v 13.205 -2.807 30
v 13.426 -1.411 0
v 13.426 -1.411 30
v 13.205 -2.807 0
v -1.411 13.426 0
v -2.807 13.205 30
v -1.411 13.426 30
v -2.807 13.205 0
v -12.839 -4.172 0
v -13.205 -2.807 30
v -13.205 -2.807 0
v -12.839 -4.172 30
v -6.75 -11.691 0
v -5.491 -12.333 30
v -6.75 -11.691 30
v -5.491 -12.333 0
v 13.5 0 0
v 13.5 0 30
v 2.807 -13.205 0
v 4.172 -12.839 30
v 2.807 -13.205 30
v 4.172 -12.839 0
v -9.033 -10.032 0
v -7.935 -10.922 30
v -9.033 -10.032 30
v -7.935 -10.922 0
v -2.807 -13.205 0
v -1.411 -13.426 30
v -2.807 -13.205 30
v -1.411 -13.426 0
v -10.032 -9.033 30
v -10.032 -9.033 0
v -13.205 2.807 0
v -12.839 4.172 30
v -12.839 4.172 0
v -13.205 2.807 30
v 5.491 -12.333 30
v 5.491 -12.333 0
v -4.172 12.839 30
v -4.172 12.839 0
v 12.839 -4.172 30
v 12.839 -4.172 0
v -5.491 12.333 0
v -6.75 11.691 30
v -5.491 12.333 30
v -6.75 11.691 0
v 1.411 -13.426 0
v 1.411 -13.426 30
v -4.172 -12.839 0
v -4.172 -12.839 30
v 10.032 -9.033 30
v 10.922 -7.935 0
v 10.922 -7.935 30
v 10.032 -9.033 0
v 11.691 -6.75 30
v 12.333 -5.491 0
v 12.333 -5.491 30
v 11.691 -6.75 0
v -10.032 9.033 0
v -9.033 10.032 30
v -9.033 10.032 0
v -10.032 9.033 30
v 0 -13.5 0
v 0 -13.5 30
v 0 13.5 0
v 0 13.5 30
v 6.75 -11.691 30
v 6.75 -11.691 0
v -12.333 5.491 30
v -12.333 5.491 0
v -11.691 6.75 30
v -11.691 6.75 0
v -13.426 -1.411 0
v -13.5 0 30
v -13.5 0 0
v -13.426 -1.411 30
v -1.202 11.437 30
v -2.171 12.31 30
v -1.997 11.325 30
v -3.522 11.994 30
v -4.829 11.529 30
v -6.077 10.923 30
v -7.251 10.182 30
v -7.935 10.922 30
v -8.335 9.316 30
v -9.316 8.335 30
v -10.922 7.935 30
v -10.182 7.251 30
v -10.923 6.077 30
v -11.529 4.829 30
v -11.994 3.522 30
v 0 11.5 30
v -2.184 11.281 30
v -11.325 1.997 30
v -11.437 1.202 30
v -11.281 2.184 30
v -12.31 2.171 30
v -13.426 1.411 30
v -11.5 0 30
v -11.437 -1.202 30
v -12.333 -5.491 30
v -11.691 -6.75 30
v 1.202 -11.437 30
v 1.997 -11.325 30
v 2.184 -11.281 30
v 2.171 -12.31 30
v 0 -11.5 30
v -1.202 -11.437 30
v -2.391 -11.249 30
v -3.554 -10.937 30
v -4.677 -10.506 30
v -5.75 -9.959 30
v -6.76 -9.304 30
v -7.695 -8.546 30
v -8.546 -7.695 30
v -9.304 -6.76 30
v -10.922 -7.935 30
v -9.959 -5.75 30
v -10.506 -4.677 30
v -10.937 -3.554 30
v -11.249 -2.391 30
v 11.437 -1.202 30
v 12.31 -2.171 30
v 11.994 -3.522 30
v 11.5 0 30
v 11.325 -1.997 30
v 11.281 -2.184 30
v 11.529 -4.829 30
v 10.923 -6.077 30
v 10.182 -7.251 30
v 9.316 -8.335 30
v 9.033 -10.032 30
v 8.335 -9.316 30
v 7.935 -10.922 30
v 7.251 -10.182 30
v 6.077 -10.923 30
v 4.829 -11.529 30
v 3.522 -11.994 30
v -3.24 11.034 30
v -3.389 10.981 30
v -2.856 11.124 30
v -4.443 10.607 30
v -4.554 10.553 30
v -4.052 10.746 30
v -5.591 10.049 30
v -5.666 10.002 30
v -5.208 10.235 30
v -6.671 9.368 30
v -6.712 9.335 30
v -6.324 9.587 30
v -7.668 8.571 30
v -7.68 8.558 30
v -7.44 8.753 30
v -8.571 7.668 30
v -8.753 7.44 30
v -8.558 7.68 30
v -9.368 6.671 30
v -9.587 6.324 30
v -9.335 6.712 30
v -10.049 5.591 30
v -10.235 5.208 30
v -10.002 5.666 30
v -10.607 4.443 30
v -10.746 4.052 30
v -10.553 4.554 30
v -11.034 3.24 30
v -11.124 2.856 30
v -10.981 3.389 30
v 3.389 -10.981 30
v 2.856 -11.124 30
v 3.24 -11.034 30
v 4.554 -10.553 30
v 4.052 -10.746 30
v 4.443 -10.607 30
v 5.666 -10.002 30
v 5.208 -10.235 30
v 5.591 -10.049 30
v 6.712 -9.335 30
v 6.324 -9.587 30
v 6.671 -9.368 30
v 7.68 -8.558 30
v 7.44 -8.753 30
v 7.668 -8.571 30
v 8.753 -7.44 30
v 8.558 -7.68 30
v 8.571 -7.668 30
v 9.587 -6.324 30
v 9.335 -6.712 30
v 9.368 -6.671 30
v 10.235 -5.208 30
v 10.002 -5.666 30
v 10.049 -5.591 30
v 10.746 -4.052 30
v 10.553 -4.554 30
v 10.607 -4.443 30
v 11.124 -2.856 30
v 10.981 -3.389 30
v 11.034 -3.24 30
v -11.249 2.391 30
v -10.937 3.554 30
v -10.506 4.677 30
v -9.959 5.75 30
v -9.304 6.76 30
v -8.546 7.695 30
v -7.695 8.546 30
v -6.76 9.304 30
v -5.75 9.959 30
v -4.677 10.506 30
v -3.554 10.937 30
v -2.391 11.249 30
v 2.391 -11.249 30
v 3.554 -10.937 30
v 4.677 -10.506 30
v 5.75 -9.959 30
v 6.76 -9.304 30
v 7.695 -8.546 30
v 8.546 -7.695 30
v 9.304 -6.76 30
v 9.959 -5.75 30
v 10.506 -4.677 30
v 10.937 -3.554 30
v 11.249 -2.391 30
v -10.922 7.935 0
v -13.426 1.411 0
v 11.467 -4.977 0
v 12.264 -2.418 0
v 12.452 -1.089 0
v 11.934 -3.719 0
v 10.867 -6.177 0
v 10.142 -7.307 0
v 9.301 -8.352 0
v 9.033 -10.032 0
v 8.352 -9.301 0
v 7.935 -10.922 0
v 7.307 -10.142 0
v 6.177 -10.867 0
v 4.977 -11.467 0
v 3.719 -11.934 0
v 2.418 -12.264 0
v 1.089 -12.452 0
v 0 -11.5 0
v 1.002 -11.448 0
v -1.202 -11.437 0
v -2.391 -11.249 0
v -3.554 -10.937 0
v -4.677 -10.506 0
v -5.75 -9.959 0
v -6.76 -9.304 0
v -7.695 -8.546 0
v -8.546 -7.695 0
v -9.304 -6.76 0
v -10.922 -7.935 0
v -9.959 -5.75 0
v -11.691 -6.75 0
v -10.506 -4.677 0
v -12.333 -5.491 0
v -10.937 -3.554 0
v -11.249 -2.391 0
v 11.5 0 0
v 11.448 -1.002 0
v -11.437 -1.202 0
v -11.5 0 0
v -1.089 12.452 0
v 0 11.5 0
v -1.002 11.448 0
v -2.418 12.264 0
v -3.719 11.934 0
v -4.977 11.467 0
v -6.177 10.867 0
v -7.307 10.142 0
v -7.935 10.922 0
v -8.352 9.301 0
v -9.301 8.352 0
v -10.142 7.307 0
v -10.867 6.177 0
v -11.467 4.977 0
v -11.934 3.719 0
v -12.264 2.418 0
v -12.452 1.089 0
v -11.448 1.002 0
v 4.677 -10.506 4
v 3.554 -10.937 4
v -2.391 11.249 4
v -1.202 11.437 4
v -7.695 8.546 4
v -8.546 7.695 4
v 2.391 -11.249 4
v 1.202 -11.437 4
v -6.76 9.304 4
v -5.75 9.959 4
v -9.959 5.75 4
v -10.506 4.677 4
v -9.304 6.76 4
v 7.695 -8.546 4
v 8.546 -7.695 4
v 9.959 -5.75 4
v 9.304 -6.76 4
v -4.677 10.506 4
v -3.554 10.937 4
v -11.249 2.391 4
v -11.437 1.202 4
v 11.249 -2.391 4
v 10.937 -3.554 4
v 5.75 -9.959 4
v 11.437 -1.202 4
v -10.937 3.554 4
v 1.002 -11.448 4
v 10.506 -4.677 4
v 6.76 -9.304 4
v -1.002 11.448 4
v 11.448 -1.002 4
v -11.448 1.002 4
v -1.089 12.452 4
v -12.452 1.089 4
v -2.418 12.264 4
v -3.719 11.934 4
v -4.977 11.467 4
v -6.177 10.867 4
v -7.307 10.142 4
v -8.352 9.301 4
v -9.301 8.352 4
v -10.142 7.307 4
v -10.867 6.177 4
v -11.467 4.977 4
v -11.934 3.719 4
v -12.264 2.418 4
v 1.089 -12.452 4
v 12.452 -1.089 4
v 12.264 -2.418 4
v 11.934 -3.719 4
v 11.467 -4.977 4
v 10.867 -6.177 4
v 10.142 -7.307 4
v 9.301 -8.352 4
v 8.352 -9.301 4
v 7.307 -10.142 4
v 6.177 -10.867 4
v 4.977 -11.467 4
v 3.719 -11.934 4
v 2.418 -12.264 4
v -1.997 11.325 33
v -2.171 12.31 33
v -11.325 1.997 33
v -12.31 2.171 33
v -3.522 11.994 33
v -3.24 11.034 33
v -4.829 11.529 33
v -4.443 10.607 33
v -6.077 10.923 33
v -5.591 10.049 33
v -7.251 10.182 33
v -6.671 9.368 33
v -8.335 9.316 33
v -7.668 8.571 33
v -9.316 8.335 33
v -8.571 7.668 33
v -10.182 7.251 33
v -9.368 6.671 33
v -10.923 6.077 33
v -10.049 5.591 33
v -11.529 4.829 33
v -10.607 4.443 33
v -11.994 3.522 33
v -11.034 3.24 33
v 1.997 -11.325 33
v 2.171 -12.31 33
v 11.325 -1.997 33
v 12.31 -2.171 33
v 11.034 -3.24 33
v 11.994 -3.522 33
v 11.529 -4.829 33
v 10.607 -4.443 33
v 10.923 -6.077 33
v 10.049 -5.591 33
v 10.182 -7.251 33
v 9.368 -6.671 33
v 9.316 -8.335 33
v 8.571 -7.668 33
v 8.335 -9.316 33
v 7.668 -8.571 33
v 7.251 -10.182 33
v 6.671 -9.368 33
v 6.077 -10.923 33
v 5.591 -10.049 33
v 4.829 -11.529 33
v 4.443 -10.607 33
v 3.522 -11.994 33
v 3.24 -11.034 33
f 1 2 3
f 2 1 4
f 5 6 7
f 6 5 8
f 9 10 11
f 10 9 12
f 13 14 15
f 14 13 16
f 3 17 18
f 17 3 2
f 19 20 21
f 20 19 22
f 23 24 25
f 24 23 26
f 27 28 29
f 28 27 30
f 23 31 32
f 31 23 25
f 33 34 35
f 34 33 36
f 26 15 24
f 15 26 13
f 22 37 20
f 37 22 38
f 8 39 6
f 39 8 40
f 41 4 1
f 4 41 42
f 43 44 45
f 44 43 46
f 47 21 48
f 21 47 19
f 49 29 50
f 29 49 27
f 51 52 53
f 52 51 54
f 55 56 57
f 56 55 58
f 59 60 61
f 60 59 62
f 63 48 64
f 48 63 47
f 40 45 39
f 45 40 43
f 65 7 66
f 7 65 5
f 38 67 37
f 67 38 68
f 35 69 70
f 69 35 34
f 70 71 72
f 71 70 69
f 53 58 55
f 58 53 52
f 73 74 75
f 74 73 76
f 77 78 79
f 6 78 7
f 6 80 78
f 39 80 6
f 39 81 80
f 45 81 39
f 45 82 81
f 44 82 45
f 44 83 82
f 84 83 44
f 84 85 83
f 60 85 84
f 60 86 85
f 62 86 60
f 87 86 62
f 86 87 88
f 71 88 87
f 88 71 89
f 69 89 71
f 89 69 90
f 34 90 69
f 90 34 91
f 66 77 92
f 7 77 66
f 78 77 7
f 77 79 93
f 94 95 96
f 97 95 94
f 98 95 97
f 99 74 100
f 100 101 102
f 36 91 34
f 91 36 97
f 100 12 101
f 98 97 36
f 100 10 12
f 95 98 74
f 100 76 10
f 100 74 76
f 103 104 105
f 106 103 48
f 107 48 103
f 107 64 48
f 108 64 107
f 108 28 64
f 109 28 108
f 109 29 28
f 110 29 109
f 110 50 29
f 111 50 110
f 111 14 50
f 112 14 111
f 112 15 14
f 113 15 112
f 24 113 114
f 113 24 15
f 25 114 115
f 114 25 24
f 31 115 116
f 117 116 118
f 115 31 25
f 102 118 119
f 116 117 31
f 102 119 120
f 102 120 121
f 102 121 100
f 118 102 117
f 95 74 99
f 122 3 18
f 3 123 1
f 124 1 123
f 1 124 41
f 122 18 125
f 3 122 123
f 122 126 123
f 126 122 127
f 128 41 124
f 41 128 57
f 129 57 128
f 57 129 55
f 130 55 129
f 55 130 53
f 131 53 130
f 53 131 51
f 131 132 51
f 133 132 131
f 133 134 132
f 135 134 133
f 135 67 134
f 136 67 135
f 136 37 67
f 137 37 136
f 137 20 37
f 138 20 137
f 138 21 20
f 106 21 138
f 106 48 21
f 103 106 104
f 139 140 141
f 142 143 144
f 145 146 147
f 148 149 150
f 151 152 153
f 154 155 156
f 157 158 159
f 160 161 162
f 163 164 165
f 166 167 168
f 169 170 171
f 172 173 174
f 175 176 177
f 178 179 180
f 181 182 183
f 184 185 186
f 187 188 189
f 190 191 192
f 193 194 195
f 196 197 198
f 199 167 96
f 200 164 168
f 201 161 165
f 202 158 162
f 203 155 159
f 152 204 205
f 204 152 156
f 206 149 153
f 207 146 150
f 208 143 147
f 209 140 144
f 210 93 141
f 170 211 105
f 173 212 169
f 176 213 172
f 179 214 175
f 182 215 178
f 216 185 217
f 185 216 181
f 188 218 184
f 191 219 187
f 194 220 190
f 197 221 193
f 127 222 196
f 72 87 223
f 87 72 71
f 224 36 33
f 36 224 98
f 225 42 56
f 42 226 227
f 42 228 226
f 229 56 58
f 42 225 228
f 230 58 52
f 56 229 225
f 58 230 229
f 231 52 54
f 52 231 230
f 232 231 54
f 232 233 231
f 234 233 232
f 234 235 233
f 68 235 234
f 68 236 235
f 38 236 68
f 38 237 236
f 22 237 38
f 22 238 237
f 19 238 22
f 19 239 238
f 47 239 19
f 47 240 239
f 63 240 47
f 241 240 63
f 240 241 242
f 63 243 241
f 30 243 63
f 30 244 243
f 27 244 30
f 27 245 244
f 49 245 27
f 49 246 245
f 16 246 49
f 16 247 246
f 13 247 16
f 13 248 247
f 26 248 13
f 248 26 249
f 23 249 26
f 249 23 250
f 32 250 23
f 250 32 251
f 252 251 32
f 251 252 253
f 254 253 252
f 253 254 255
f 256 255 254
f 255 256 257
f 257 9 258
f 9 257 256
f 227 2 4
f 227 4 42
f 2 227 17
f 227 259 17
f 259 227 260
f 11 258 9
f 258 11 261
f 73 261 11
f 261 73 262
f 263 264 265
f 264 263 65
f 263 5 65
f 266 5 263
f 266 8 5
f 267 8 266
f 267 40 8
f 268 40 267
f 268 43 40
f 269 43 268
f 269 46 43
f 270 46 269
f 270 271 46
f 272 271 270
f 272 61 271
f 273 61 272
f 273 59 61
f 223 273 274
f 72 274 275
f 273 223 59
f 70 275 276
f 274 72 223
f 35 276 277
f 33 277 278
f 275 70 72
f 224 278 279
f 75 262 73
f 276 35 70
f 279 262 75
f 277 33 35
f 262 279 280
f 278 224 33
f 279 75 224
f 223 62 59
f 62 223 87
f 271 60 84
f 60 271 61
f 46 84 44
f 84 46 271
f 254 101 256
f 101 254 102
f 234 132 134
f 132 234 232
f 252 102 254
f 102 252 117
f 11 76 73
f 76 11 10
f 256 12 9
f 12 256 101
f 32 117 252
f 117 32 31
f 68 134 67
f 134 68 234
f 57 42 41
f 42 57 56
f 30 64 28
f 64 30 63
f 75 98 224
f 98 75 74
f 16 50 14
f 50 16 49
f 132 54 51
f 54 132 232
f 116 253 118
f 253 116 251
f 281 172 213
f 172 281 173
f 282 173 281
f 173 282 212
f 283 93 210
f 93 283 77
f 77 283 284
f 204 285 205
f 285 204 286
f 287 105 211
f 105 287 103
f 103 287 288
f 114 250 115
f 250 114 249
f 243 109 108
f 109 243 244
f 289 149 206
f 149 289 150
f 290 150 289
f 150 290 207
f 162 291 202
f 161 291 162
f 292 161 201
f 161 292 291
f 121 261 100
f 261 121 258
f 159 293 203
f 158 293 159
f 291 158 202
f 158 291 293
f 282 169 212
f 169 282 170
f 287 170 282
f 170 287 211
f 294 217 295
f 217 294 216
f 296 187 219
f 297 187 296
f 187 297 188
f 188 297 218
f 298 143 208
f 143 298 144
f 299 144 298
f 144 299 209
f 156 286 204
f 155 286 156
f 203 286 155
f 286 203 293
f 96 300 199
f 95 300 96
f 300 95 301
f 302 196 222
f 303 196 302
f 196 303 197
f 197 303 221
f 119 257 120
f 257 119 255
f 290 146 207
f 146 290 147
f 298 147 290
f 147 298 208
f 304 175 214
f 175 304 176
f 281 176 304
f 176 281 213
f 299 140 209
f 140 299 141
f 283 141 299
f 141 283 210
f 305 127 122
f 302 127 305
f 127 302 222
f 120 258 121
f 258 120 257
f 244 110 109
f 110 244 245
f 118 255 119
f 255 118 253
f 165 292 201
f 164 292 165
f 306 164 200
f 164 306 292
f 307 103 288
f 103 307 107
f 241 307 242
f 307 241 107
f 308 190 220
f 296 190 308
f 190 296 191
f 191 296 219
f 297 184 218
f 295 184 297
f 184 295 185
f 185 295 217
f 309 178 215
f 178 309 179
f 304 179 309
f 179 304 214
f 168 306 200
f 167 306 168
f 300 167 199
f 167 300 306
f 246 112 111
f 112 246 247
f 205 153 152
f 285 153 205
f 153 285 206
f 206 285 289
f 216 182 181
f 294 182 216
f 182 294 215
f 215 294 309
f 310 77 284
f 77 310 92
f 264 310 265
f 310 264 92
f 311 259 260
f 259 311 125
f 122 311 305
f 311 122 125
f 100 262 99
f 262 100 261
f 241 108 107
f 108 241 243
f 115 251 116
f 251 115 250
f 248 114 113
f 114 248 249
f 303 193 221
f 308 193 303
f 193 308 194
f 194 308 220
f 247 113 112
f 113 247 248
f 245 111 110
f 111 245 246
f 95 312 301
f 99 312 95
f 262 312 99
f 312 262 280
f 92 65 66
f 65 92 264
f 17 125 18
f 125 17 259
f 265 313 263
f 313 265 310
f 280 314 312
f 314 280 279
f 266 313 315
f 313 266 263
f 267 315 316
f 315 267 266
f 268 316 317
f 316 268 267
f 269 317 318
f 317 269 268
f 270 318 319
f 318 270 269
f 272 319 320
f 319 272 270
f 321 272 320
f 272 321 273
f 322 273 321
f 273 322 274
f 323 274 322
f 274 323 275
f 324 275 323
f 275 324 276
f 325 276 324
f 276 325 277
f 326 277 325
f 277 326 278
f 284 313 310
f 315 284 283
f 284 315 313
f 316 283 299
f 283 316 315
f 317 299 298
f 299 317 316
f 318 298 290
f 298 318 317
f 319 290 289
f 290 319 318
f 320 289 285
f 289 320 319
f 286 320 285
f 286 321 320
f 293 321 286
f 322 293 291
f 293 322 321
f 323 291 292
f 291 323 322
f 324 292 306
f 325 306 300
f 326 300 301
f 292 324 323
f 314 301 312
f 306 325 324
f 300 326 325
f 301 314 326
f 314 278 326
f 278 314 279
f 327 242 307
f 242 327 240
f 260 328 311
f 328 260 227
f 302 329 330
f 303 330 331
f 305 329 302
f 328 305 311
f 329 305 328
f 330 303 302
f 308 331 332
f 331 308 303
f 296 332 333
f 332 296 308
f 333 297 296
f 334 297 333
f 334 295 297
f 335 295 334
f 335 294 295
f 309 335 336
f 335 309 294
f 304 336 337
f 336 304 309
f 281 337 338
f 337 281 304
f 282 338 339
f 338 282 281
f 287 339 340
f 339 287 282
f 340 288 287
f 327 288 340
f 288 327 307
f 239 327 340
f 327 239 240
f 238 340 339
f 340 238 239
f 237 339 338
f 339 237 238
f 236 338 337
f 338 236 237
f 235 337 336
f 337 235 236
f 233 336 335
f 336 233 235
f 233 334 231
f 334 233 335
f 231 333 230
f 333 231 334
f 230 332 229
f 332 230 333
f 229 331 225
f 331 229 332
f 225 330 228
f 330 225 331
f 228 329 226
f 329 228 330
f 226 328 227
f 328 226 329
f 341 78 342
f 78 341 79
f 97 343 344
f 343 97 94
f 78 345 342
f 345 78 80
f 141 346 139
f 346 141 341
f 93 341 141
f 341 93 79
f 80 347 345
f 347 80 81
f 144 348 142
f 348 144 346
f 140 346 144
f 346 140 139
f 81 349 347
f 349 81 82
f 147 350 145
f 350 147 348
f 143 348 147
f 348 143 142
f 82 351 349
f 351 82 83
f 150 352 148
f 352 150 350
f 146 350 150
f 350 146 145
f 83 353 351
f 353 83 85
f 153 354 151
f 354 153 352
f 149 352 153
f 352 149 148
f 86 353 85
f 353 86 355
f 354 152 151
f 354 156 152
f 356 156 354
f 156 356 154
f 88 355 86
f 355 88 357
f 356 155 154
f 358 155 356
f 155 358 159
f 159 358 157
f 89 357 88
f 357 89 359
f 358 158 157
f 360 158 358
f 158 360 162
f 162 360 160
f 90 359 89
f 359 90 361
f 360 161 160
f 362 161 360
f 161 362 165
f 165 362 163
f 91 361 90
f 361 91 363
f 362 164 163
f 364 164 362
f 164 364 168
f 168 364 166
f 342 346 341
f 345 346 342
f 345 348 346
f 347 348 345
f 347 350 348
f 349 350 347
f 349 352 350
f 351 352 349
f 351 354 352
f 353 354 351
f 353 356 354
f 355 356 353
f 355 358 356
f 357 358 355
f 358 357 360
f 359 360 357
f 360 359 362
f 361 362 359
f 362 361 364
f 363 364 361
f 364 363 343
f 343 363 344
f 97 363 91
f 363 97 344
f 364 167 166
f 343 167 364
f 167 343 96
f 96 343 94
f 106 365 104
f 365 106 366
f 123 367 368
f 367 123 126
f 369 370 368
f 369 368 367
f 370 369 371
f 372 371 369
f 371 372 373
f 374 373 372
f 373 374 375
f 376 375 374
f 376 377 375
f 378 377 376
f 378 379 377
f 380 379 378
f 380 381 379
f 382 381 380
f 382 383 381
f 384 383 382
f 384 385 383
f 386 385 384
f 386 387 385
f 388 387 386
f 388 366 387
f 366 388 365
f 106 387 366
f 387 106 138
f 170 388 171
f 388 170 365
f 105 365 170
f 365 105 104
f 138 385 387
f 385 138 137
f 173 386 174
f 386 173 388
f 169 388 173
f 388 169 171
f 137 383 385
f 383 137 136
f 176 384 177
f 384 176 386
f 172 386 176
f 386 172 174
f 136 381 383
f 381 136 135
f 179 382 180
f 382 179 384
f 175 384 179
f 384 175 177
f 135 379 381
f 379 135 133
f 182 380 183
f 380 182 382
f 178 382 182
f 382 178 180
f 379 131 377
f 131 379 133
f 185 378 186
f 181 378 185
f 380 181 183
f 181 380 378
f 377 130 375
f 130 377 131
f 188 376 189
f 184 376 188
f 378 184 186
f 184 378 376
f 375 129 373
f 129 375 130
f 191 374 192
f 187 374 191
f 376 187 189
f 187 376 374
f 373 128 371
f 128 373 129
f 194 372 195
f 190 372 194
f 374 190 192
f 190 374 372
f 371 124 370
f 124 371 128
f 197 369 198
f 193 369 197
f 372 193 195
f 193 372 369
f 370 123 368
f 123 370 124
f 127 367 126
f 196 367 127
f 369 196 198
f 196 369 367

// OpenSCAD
ball_diameter = 9.5;
inner_diameter = 23;
wall_thickness = 2;
wall_height = 30;
joint_height = 3;
joint_clearance = 2;
joint_angle = 80;
joint_angle_clearance = 10;

outer_diameter = inner_diameter + wall_thickness * 2;

$fn = 60;

difference() {
    cylinder(d = outer_diameter, h = wall_height);

    translate([0, 0, -1])
    cylinder(d = inner_diameter, h = wall_height + 2);

    translate([0, 0, -1])
    cube([outer_diameter, outer_diameter, wall_height + 2]);

    translate([0, 0, -1])
    rotate([0, 0, 135 - joint_angle / 2])
    rotate_extrude(angle = joint_angle, convexity = 10)
    translate([inner_diameter / 2 - 1, 0, 0])
    square([wall_thickness / 2 + 1, joint_height + joint_clearance]);

    translate([0, 0, -1])
    rotate([0, 0, 315 - joint_angle / 2])
    rotate_extrude(angle = joint_angle, convexity = 10)
    translate([inner_diameter / 2 - 1, 0, 0])
    square([wall_thickness / 2 + 1, joint_height + joint_clearance]);
}

translate([0, 0, wall_height])
union() {
    male_angle = joint_angle - joint_angle_clearance;

    rotate([0, 0, 135 - male_angle / 2])
    rotate_extrude(angle = male_angle, convexity = 10)
    translate([inner_diameter / 2, 0, 0])
    square([wall_thickness / 2, joint_height]);

    rotate([0, 0, 315 - male_angle / 2])
    rotate_extrude(angle = male_angle, convexity = 10)
    translate([inner_diameter / 2, 0, 0])
    square([wall_thickness / 2, joint_height]);
}
